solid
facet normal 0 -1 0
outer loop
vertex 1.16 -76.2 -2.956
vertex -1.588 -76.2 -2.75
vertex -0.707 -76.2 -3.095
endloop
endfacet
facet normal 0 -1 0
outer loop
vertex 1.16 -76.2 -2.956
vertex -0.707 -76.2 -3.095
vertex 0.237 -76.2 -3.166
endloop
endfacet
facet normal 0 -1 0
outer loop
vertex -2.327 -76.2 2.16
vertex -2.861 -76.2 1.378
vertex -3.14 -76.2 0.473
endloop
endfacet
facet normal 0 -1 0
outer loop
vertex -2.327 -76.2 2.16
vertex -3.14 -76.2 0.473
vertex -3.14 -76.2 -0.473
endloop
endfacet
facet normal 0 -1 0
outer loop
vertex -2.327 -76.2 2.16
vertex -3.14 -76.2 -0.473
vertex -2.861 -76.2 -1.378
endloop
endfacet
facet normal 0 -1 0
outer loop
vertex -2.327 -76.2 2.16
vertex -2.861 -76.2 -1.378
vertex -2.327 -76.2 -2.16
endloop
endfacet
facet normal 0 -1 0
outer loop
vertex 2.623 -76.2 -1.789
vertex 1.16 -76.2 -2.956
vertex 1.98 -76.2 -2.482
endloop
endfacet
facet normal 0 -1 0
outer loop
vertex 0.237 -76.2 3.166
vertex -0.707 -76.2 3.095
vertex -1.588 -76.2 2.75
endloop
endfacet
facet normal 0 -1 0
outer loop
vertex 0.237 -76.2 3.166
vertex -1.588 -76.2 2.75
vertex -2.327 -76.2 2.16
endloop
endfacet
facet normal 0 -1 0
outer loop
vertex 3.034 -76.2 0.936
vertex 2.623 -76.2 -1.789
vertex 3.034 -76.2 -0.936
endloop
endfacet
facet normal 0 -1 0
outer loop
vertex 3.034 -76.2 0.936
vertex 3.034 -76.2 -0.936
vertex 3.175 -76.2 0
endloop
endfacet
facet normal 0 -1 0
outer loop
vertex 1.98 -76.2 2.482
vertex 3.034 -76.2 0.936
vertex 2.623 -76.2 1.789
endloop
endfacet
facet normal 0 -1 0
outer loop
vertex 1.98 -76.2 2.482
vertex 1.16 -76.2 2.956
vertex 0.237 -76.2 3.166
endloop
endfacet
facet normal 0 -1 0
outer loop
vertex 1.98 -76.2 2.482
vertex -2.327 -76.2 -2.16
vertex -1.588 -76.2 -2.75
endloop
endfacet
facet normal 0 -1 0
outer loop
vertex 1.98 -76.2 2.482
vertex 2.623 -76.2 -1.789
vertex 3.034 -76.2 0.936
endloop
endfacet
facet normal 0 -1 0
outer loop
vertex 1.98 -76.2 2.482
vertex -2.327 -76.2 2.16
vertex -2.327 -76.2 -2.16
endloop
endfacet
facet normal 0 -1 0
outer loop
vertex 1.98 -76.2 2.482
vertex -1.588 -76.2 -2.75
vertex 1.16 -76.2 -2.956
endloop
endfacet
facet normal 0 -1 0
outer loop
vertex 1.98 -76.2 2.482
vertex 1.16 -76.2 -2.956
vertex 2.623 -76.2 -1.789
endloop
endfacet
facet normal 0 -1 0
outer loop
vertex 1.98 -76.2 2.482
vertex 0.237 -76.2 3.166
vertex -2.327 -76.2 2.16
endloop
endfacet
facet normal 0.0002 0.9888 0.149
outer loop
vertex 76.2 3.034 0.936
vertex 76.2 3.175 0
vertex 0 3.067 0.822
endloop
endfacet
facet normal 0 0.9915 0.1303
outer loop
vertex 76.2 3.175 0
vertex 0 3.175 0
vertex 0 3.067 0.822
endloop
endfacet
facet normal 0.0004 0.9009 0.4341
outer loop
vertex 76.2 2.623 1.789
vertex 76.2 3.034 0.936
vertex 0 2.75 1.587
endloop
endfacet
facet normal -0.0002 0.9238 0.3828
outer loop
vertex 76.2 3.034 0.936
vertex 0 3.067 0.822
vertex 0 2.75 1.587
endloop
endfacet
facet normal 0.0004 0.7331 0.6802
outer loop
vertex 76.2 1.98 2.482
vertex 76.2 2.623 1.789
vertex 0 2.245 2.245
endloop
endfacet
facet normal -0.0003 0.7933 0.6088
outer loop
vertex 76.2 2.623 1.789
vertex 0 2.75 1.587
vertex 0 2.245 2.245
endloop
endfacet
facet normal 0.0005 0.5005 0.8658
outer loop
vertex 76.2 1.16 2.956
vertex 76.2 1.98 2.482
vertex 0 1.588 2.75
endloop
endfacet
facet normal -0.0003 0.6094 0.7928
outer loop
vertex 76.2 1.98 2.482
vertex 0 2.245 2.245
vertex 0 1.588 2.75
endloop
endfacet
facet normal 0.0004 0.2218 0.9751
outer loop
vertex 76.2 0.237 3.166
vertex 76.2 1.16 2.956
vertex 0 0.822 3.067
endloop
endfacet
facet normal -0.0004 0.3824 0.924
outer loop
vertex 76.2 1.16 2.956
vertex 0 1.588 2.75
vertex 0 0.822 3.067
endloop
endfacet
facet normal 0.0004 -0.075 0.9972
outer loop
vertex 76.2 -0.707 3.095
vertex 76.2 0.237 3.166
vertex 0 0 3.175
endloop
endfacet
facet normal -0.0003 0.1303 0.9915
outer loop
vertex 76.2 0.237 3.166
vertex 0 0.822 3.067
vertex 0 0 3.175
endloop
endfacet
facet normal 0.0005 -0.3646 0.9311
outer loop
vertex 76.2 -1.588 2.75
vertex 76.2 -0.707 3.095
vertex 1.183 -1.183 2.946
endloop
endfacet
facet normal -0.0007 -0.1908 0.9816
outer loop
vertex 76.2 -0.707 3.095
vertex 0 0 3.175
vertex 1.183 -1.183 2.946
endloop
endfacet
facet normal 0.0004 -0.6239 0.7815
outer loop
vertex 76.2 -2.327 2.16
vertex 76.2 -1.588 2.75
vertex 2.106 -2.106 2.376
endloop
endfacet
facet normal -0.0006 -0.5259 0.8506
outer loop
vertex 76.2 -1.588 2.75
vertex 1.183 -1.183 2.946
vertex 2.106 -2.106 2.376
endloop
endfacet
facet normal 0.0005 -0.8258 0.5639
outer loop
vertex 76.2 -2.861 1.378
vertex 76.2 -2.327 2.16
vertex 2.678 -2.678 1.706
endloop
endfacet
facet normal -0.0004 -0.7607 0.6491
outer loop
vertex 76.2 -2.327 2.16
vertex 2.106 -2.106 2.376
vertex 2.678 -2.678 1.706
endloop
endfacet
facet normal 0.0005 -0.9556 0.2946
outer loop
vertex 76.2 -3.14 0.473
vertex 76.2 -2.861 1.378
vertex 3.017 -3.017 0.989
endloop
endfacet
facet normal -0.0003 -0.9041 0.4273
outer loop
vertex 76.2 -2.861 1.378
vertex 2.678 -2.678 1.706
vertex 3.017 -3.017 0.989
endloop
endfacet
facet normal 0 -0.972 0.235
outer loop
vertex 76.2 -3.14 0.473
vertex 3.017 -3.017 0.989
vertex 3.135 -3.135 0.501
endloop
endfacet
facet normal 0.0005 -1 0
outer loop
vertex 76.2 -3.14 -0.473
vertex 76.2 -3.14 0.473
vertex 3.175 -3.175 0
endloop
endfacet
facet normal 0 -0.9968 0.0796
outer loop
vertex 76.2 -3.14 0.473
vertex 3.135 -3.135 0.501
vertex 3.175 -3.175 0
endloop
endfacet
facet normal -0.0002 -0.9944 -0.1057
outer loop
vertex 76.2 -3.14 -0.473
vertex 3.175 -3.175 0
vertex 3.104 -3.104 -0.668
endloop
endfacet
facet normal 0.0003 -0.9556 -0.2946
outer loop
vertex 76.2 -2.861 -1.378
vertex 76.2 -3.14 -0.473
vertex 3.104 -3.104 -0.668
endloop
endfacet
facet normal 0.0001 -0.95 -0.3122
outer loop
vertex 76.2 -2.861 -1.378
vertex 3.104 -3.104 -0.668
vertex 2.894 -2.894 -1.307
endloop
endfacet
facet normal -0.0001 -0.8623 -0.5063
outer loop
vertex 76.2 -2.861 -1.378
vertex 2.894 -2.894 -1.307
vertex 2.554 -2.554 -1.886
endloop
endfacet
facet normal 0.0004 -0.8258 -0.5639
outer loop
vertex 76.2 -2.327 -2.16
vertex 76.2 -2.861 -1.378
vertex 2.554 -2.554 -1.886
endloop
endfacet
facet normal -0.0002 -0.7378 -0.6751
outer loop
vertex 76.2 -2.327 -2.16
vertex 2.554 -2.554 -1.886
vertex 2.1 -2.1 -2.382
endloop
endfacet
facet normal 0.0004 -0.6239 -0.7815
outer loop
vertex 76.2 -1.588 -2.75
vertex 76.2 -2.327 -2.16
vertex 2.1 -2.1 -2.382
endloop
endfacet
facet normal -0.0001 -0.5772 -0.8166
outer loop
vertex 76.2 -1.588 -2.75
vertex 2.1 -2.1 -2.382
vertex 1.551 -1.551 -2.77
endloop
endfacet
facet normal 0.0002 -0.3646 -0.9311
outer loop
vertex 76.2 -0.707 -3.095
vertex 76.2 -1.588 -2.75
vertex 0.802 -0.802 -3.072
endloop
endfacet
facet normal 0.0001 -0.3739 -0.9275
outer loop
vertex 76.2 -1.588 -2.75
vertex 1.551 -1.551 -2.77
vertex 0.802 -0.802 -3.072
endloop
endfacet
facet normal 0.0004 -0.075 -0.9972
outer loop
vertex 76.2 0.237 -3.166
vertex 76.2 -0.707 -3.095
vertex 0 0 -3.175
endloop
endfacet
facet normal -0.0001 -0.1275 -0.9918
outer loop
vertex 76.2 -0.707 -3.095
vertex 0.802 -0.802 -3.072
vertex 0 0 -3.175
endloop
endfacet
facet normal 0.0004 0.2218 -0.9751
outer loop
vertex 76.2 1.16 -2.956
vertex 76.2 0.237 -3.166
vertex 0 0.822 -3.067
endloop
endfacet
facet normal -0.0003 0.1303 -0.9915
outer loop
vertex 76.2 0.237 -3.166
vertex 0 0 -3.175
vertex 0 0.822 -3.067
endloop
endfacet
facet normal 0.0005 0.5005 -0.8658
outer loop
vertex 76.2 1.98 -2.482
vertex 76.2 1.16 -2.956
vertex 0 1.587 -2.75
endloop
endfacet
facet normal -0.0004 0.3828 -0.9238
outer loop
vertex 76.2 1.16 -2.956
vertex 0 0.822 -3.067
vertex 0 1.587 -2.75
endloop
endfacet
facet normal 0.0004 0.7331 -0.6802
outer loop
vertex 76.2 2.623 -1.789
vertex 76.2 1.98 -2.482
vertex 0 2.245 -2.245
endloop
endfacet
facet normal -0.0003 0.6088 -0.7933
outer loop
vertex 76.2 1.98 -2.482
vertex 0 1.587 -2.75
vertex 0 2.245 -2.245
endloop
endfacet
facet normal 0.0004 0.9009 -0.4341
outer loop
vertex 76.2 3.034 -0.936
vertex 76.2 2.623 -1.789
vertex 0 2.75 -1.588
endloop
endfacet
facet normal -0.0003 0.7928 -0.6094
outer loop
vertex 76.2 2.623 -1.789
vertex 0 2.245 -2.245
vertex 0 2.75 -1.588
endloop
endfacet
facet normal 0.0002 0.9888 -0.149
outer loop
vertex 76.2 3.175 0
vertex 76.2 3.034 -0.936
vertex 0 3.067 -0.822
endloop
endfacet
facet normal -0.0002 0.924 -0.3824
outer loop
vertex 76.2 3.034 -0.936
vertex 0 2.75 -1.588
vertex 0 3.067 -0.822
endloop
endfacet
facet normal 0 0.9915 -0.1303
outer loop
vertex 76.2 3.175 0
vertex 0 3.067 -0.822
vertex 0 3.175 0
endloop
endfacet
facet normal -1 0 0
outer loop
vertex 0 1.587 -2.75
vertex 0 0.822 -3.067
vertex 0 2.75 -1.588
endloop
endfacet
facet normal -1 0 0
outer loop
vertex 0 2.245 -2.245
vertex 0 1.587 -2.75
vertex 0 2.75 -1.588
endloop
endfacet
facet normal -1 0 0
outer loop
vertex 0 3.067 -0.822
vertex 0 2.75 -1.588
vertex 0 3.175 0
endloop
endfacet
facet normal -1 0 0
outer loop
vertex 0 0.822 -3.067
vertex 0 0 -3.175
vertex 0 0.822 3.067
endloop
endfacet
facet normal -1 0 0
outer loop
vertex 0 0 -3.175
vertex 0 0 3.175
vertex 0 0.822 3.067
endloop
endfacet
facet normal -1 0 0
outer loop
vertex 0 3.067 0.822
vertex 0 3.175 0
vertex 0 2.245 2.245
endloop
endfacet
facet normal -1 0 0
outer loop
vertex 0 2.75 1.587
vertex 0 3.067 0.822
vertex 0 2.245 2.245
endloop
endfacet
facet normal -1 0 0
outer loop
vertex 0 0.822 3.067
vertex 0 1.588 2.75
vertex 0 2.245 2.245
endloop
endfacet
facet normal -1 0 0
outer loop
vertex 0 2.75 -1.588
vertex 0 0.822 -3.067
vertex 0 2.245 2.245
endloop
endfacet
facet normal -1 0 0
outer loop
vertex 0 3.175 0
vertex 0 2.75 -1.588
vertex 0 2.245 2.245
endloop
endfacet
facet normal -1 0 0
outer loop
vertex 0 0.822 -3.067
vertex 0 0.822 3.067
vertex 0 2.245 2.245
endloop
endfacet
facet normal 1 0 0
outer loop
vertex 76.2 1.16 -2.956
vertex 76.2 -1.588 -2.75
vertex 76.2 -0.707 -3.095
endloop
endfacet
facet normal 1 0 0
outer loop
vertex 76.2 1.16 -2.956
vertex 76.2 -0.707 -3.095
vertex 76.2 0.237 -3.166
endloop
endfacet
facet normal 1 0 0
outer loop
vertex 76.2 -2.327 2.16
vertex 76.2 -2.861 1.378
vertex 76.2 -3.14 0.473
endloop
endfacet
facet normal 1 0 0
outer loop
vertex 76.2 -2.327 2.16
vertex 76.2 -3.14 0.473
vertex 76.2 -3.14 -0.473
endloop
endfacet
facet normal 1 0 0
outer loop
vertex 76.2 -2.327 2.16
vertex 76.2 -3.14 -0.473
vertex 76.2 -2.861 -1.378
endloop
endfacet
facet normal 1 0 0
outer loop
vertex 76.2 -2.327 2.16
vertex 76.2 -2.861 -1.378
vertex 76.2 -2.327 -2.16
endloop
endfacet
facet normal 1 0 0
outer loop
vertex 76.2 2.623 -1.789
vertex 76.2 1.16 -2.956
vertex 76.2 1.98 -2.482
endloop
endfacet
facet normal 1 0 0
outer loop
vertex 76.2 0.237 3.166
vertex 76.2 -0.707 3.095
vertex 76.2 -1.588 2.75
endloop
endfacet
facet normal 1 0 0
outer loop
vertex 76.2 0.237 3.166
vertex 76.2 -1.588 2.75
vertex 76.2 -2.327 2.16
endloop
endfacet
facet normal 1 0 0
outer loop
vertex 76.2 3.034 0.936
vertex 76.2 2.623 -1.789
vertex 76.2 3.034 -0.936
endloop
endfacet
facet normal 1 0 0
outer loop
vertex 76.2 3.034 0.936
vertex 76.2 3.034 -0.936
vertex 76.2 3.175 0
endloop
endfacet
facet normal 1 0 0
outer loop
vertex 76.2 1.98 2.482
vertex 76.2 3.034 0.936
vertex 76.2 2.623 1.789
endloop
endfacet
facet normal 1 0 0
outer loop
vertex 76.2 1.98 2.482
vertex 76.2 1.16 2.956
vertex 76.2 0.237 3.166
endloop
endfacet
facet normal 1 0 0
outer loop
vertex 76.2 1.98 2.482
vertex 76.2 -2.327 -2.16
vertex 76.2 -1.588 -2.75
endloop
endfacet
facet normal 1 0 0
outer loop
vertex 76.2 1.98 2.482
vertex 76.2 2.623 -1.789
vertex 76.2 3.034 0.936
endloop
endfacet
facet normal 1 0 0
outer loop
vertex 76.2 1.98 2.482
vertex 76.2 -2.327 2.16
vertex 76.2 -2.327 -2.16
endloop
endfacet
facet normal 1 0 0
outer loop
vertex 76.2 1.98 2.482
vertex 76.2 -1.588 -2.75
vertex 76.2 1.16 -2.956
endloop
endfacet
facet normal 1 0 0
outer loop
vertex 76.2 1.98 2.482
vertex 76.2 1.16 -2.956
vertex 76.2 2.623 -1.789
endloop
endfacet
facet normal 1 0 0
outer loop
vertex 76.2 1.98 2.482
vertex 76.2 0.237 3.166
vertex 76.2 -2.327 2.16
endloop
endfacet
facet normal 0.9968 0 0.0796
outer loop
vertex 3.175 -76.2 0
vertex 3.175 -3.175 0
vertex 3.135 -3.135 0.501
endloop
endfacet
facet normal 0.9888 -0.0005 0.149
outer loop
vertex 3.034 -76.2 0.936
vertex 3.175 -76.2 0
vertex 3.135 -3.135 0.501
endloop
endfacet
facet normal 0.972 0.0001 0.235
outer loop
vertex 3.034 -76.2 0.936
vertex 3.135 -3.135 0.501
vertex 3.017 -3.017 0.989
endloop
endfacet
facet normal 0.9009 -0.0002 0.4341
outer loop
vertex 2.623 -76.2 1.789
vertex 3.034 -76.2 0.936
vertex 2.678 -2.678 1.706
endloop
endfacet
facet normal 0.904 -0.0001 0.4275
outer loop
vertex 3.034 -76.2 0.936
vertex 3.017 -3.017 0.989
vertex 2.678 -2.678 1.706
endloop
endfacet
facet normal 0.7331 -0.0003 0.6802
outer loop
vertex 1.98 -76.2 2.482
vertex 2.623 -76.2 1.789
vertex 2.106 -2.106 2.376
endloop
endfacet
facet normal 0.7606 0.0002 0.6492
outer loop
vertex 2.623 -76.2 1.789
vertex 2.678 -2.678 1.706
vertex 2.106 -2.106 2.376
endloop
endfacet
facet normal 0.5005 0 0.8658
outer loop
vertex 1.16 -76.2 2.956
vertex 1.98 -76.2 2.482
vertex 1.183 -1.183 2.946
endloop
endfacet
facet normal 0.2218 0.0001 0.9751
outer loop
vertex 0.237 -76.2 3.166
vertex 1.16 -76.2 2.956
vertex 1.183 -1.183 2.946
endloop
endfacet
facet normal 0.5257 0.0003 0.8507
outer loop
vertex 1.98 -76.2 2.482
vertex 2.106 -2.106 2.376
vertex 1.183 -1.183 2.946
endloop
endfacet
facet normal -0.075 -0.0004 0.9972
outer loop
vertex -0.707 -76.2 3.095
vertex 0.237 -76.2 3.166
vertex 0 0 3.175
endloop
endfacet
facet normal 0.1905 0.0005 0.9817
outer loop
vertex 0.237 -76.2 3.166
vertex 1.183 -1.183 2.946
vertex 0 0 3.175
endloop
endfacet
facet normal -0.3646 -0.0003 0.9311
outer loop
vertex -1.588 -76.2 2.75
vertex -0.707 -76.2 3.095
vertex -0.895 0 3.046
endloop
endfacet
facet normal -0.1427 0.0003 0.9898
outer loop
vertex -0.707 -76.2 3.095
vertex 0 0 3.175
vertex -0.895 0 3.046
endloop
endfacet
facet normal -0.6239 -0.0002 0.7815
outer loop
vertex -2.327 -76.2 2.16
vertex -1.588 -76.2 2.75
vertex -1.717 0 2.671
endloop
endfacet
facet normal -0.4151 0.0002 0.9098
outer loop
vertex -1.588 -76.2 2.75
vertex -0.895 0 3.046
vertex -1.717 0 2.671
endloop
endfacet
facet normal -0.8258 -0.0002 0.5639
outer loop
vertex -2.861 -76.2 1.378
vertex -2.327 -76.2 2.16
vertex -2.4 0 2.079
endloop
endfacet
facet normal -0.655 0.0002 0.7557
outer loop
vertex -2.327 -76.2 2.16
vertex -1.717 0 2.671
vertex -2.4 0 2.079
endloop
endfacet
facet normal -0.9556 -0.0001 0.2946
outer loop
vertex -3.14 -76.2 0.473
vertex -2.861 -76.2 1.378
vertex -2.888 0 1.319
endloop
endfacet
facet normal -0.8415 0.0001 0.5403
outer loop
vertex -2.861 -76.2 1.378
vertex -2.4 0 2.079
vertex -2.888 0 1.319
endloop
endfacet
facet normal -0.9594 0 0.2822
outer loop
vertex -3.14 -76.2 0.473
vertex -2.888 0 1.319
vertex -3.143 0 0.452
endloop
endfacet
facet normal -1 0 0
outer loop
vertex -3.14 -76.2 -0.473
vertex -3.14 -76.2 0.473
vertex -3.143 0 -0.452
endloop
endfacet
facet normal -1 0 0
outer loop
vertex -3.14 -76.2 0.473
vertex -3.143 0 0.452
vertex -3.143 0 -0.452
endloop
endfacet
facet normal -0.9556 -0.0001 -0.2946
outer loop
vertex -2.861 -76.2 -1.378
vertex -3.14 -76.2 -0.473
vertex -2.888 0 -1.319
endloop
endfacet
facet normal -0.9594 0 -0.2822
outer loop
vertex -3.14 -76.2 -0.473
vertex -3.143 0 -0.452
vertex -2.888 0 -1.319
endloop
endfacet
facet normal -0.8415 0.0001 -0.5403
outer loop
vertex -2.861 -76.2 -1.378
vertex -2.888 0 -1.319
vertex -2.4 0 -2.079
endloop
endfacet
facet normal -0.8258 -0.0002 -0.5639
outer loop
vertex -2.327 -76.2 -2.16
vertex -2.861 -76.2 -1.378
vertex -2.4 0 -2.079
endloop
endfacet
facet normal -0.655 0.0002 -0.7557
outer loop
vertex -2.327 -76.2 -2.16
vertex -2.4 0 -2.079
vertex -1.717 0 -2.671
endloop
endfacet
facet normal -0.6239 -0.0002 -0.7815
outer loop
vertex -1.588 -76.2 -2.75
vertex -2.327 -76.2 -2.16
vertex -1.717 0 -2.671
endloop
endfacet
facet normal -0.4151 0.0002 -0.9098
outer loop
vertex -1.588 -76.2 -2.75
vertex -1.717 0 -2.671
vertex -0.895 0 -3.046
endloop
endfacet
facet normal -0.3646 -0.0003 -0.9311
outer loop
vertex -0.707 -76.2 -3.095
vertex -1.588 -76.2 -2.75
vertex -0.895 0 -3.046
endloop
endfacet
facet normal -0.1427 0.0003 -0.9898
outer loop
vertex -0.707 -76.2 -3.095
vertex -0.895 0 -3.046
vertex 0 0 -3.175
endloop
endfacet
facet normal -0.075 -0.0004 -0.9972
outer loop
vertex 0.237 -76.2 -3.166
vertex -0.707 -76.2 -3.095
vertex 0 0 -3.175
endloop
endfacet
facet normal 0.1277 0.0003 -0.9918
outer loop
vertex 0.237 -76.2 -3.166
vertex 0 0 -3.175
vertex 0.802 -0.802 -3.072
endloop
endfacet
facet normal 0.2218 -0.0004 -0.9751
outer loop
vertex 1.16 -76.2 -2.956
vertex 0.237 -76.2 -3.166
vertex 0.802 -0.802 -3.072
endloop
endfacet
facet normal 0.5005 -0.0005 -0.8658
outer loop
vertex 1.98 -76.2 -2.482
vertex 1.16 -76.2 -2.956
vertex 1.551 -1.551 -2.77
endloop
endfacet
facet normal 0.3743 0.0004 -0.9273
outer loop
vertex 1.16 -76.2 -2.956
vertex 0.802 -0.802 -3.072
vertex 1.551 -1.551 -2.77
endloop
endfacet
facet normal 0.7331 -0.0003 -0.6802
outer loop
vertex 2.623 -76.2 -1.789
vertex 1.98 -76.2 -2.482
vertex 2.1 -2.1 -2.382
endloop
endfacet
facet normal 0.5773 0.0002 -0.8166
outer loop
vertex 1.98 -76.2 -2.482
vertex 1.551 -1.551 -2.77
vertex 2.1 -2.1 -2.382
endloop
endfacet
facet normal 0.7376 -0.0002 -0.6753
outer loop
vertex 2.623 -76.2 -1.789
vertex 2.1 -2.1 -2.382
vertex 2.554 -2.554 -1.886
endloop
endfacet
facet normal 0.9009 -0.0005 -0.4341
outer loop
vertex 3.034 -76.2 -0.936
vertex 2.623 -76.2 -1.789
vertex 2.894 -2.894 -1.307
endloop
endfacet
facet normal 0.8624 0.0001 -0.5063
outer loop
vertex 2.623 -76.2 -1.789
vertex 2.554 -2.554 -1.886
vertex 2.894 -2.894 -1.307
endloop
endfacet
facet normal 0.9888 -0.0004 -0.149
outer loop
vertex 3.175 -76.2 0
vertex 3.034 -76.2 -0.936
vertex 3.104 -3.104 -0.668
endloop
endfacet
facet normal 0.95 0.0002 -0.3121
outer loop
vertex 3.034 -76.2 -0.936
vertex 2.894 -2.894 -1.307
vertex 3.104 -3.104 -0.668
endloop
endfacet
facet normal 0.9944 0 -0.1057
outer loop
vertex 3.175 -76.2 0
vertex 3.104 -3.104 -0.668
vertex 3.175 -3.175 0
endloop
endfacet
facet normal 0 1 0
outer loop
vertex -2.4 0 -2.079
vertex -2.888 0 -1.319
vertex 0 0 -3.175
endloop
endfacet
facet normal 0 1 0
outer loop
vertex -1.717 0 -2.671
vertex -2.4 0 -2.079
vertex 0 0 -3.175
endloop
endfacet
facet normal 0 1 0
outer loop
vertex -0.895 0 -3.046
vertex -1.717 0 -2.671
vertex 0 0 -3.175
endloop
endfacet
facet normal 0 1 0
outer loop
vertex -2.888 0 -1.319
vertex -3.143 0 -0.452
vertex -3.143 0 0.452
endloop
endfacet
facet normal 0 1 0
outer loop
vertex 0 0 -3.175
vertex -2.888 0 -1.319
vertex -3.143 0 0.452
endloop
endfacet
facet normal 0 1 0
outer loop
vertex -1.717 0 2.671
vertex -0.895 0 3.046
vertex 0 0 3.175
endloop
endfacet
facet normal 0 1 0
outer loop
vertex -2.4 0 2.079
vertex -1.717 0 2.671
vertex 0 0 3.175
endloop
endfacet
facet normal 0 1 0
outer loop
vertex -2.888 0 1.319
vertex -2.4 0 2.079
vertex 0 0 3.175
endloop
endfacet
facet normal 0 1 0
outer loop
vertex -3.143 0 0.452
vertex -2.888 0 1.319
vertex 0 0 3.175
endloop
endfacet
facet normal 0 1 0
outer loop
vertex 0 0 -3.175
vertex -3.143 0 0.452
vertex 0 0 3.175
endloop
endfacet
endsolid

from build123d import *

# Parameters (mm, degrees)
F0_R      = 3.175
F1_DEPTH  = 76.2
F2_R      = 3.175
F3_DEPTH  = 25.4
F3_FACE_R = 3.175
F4_DEPTH  = 50.8


with BuildPart() as f1:
    # F0 (on Front) → F1 (new body)
    with BuildSketch(Plane.XZ):
        Circle(F0_R)
    extrude(amount=F1_DEPTH)

    # F2 (on Right) → F3 (join)
    with BuildSketch(Plane.YZ):
        Circle(F2_R)
    extrude(amount=F3_DEPTH)

    # F3_face (on face) → F4 (join)
    with BuildSketch(Plane.YZ.offset(25.4)):
        Circle(F3_FACE_R)
    extrude(amount=F4_DEPTH)


solid = f1.part
